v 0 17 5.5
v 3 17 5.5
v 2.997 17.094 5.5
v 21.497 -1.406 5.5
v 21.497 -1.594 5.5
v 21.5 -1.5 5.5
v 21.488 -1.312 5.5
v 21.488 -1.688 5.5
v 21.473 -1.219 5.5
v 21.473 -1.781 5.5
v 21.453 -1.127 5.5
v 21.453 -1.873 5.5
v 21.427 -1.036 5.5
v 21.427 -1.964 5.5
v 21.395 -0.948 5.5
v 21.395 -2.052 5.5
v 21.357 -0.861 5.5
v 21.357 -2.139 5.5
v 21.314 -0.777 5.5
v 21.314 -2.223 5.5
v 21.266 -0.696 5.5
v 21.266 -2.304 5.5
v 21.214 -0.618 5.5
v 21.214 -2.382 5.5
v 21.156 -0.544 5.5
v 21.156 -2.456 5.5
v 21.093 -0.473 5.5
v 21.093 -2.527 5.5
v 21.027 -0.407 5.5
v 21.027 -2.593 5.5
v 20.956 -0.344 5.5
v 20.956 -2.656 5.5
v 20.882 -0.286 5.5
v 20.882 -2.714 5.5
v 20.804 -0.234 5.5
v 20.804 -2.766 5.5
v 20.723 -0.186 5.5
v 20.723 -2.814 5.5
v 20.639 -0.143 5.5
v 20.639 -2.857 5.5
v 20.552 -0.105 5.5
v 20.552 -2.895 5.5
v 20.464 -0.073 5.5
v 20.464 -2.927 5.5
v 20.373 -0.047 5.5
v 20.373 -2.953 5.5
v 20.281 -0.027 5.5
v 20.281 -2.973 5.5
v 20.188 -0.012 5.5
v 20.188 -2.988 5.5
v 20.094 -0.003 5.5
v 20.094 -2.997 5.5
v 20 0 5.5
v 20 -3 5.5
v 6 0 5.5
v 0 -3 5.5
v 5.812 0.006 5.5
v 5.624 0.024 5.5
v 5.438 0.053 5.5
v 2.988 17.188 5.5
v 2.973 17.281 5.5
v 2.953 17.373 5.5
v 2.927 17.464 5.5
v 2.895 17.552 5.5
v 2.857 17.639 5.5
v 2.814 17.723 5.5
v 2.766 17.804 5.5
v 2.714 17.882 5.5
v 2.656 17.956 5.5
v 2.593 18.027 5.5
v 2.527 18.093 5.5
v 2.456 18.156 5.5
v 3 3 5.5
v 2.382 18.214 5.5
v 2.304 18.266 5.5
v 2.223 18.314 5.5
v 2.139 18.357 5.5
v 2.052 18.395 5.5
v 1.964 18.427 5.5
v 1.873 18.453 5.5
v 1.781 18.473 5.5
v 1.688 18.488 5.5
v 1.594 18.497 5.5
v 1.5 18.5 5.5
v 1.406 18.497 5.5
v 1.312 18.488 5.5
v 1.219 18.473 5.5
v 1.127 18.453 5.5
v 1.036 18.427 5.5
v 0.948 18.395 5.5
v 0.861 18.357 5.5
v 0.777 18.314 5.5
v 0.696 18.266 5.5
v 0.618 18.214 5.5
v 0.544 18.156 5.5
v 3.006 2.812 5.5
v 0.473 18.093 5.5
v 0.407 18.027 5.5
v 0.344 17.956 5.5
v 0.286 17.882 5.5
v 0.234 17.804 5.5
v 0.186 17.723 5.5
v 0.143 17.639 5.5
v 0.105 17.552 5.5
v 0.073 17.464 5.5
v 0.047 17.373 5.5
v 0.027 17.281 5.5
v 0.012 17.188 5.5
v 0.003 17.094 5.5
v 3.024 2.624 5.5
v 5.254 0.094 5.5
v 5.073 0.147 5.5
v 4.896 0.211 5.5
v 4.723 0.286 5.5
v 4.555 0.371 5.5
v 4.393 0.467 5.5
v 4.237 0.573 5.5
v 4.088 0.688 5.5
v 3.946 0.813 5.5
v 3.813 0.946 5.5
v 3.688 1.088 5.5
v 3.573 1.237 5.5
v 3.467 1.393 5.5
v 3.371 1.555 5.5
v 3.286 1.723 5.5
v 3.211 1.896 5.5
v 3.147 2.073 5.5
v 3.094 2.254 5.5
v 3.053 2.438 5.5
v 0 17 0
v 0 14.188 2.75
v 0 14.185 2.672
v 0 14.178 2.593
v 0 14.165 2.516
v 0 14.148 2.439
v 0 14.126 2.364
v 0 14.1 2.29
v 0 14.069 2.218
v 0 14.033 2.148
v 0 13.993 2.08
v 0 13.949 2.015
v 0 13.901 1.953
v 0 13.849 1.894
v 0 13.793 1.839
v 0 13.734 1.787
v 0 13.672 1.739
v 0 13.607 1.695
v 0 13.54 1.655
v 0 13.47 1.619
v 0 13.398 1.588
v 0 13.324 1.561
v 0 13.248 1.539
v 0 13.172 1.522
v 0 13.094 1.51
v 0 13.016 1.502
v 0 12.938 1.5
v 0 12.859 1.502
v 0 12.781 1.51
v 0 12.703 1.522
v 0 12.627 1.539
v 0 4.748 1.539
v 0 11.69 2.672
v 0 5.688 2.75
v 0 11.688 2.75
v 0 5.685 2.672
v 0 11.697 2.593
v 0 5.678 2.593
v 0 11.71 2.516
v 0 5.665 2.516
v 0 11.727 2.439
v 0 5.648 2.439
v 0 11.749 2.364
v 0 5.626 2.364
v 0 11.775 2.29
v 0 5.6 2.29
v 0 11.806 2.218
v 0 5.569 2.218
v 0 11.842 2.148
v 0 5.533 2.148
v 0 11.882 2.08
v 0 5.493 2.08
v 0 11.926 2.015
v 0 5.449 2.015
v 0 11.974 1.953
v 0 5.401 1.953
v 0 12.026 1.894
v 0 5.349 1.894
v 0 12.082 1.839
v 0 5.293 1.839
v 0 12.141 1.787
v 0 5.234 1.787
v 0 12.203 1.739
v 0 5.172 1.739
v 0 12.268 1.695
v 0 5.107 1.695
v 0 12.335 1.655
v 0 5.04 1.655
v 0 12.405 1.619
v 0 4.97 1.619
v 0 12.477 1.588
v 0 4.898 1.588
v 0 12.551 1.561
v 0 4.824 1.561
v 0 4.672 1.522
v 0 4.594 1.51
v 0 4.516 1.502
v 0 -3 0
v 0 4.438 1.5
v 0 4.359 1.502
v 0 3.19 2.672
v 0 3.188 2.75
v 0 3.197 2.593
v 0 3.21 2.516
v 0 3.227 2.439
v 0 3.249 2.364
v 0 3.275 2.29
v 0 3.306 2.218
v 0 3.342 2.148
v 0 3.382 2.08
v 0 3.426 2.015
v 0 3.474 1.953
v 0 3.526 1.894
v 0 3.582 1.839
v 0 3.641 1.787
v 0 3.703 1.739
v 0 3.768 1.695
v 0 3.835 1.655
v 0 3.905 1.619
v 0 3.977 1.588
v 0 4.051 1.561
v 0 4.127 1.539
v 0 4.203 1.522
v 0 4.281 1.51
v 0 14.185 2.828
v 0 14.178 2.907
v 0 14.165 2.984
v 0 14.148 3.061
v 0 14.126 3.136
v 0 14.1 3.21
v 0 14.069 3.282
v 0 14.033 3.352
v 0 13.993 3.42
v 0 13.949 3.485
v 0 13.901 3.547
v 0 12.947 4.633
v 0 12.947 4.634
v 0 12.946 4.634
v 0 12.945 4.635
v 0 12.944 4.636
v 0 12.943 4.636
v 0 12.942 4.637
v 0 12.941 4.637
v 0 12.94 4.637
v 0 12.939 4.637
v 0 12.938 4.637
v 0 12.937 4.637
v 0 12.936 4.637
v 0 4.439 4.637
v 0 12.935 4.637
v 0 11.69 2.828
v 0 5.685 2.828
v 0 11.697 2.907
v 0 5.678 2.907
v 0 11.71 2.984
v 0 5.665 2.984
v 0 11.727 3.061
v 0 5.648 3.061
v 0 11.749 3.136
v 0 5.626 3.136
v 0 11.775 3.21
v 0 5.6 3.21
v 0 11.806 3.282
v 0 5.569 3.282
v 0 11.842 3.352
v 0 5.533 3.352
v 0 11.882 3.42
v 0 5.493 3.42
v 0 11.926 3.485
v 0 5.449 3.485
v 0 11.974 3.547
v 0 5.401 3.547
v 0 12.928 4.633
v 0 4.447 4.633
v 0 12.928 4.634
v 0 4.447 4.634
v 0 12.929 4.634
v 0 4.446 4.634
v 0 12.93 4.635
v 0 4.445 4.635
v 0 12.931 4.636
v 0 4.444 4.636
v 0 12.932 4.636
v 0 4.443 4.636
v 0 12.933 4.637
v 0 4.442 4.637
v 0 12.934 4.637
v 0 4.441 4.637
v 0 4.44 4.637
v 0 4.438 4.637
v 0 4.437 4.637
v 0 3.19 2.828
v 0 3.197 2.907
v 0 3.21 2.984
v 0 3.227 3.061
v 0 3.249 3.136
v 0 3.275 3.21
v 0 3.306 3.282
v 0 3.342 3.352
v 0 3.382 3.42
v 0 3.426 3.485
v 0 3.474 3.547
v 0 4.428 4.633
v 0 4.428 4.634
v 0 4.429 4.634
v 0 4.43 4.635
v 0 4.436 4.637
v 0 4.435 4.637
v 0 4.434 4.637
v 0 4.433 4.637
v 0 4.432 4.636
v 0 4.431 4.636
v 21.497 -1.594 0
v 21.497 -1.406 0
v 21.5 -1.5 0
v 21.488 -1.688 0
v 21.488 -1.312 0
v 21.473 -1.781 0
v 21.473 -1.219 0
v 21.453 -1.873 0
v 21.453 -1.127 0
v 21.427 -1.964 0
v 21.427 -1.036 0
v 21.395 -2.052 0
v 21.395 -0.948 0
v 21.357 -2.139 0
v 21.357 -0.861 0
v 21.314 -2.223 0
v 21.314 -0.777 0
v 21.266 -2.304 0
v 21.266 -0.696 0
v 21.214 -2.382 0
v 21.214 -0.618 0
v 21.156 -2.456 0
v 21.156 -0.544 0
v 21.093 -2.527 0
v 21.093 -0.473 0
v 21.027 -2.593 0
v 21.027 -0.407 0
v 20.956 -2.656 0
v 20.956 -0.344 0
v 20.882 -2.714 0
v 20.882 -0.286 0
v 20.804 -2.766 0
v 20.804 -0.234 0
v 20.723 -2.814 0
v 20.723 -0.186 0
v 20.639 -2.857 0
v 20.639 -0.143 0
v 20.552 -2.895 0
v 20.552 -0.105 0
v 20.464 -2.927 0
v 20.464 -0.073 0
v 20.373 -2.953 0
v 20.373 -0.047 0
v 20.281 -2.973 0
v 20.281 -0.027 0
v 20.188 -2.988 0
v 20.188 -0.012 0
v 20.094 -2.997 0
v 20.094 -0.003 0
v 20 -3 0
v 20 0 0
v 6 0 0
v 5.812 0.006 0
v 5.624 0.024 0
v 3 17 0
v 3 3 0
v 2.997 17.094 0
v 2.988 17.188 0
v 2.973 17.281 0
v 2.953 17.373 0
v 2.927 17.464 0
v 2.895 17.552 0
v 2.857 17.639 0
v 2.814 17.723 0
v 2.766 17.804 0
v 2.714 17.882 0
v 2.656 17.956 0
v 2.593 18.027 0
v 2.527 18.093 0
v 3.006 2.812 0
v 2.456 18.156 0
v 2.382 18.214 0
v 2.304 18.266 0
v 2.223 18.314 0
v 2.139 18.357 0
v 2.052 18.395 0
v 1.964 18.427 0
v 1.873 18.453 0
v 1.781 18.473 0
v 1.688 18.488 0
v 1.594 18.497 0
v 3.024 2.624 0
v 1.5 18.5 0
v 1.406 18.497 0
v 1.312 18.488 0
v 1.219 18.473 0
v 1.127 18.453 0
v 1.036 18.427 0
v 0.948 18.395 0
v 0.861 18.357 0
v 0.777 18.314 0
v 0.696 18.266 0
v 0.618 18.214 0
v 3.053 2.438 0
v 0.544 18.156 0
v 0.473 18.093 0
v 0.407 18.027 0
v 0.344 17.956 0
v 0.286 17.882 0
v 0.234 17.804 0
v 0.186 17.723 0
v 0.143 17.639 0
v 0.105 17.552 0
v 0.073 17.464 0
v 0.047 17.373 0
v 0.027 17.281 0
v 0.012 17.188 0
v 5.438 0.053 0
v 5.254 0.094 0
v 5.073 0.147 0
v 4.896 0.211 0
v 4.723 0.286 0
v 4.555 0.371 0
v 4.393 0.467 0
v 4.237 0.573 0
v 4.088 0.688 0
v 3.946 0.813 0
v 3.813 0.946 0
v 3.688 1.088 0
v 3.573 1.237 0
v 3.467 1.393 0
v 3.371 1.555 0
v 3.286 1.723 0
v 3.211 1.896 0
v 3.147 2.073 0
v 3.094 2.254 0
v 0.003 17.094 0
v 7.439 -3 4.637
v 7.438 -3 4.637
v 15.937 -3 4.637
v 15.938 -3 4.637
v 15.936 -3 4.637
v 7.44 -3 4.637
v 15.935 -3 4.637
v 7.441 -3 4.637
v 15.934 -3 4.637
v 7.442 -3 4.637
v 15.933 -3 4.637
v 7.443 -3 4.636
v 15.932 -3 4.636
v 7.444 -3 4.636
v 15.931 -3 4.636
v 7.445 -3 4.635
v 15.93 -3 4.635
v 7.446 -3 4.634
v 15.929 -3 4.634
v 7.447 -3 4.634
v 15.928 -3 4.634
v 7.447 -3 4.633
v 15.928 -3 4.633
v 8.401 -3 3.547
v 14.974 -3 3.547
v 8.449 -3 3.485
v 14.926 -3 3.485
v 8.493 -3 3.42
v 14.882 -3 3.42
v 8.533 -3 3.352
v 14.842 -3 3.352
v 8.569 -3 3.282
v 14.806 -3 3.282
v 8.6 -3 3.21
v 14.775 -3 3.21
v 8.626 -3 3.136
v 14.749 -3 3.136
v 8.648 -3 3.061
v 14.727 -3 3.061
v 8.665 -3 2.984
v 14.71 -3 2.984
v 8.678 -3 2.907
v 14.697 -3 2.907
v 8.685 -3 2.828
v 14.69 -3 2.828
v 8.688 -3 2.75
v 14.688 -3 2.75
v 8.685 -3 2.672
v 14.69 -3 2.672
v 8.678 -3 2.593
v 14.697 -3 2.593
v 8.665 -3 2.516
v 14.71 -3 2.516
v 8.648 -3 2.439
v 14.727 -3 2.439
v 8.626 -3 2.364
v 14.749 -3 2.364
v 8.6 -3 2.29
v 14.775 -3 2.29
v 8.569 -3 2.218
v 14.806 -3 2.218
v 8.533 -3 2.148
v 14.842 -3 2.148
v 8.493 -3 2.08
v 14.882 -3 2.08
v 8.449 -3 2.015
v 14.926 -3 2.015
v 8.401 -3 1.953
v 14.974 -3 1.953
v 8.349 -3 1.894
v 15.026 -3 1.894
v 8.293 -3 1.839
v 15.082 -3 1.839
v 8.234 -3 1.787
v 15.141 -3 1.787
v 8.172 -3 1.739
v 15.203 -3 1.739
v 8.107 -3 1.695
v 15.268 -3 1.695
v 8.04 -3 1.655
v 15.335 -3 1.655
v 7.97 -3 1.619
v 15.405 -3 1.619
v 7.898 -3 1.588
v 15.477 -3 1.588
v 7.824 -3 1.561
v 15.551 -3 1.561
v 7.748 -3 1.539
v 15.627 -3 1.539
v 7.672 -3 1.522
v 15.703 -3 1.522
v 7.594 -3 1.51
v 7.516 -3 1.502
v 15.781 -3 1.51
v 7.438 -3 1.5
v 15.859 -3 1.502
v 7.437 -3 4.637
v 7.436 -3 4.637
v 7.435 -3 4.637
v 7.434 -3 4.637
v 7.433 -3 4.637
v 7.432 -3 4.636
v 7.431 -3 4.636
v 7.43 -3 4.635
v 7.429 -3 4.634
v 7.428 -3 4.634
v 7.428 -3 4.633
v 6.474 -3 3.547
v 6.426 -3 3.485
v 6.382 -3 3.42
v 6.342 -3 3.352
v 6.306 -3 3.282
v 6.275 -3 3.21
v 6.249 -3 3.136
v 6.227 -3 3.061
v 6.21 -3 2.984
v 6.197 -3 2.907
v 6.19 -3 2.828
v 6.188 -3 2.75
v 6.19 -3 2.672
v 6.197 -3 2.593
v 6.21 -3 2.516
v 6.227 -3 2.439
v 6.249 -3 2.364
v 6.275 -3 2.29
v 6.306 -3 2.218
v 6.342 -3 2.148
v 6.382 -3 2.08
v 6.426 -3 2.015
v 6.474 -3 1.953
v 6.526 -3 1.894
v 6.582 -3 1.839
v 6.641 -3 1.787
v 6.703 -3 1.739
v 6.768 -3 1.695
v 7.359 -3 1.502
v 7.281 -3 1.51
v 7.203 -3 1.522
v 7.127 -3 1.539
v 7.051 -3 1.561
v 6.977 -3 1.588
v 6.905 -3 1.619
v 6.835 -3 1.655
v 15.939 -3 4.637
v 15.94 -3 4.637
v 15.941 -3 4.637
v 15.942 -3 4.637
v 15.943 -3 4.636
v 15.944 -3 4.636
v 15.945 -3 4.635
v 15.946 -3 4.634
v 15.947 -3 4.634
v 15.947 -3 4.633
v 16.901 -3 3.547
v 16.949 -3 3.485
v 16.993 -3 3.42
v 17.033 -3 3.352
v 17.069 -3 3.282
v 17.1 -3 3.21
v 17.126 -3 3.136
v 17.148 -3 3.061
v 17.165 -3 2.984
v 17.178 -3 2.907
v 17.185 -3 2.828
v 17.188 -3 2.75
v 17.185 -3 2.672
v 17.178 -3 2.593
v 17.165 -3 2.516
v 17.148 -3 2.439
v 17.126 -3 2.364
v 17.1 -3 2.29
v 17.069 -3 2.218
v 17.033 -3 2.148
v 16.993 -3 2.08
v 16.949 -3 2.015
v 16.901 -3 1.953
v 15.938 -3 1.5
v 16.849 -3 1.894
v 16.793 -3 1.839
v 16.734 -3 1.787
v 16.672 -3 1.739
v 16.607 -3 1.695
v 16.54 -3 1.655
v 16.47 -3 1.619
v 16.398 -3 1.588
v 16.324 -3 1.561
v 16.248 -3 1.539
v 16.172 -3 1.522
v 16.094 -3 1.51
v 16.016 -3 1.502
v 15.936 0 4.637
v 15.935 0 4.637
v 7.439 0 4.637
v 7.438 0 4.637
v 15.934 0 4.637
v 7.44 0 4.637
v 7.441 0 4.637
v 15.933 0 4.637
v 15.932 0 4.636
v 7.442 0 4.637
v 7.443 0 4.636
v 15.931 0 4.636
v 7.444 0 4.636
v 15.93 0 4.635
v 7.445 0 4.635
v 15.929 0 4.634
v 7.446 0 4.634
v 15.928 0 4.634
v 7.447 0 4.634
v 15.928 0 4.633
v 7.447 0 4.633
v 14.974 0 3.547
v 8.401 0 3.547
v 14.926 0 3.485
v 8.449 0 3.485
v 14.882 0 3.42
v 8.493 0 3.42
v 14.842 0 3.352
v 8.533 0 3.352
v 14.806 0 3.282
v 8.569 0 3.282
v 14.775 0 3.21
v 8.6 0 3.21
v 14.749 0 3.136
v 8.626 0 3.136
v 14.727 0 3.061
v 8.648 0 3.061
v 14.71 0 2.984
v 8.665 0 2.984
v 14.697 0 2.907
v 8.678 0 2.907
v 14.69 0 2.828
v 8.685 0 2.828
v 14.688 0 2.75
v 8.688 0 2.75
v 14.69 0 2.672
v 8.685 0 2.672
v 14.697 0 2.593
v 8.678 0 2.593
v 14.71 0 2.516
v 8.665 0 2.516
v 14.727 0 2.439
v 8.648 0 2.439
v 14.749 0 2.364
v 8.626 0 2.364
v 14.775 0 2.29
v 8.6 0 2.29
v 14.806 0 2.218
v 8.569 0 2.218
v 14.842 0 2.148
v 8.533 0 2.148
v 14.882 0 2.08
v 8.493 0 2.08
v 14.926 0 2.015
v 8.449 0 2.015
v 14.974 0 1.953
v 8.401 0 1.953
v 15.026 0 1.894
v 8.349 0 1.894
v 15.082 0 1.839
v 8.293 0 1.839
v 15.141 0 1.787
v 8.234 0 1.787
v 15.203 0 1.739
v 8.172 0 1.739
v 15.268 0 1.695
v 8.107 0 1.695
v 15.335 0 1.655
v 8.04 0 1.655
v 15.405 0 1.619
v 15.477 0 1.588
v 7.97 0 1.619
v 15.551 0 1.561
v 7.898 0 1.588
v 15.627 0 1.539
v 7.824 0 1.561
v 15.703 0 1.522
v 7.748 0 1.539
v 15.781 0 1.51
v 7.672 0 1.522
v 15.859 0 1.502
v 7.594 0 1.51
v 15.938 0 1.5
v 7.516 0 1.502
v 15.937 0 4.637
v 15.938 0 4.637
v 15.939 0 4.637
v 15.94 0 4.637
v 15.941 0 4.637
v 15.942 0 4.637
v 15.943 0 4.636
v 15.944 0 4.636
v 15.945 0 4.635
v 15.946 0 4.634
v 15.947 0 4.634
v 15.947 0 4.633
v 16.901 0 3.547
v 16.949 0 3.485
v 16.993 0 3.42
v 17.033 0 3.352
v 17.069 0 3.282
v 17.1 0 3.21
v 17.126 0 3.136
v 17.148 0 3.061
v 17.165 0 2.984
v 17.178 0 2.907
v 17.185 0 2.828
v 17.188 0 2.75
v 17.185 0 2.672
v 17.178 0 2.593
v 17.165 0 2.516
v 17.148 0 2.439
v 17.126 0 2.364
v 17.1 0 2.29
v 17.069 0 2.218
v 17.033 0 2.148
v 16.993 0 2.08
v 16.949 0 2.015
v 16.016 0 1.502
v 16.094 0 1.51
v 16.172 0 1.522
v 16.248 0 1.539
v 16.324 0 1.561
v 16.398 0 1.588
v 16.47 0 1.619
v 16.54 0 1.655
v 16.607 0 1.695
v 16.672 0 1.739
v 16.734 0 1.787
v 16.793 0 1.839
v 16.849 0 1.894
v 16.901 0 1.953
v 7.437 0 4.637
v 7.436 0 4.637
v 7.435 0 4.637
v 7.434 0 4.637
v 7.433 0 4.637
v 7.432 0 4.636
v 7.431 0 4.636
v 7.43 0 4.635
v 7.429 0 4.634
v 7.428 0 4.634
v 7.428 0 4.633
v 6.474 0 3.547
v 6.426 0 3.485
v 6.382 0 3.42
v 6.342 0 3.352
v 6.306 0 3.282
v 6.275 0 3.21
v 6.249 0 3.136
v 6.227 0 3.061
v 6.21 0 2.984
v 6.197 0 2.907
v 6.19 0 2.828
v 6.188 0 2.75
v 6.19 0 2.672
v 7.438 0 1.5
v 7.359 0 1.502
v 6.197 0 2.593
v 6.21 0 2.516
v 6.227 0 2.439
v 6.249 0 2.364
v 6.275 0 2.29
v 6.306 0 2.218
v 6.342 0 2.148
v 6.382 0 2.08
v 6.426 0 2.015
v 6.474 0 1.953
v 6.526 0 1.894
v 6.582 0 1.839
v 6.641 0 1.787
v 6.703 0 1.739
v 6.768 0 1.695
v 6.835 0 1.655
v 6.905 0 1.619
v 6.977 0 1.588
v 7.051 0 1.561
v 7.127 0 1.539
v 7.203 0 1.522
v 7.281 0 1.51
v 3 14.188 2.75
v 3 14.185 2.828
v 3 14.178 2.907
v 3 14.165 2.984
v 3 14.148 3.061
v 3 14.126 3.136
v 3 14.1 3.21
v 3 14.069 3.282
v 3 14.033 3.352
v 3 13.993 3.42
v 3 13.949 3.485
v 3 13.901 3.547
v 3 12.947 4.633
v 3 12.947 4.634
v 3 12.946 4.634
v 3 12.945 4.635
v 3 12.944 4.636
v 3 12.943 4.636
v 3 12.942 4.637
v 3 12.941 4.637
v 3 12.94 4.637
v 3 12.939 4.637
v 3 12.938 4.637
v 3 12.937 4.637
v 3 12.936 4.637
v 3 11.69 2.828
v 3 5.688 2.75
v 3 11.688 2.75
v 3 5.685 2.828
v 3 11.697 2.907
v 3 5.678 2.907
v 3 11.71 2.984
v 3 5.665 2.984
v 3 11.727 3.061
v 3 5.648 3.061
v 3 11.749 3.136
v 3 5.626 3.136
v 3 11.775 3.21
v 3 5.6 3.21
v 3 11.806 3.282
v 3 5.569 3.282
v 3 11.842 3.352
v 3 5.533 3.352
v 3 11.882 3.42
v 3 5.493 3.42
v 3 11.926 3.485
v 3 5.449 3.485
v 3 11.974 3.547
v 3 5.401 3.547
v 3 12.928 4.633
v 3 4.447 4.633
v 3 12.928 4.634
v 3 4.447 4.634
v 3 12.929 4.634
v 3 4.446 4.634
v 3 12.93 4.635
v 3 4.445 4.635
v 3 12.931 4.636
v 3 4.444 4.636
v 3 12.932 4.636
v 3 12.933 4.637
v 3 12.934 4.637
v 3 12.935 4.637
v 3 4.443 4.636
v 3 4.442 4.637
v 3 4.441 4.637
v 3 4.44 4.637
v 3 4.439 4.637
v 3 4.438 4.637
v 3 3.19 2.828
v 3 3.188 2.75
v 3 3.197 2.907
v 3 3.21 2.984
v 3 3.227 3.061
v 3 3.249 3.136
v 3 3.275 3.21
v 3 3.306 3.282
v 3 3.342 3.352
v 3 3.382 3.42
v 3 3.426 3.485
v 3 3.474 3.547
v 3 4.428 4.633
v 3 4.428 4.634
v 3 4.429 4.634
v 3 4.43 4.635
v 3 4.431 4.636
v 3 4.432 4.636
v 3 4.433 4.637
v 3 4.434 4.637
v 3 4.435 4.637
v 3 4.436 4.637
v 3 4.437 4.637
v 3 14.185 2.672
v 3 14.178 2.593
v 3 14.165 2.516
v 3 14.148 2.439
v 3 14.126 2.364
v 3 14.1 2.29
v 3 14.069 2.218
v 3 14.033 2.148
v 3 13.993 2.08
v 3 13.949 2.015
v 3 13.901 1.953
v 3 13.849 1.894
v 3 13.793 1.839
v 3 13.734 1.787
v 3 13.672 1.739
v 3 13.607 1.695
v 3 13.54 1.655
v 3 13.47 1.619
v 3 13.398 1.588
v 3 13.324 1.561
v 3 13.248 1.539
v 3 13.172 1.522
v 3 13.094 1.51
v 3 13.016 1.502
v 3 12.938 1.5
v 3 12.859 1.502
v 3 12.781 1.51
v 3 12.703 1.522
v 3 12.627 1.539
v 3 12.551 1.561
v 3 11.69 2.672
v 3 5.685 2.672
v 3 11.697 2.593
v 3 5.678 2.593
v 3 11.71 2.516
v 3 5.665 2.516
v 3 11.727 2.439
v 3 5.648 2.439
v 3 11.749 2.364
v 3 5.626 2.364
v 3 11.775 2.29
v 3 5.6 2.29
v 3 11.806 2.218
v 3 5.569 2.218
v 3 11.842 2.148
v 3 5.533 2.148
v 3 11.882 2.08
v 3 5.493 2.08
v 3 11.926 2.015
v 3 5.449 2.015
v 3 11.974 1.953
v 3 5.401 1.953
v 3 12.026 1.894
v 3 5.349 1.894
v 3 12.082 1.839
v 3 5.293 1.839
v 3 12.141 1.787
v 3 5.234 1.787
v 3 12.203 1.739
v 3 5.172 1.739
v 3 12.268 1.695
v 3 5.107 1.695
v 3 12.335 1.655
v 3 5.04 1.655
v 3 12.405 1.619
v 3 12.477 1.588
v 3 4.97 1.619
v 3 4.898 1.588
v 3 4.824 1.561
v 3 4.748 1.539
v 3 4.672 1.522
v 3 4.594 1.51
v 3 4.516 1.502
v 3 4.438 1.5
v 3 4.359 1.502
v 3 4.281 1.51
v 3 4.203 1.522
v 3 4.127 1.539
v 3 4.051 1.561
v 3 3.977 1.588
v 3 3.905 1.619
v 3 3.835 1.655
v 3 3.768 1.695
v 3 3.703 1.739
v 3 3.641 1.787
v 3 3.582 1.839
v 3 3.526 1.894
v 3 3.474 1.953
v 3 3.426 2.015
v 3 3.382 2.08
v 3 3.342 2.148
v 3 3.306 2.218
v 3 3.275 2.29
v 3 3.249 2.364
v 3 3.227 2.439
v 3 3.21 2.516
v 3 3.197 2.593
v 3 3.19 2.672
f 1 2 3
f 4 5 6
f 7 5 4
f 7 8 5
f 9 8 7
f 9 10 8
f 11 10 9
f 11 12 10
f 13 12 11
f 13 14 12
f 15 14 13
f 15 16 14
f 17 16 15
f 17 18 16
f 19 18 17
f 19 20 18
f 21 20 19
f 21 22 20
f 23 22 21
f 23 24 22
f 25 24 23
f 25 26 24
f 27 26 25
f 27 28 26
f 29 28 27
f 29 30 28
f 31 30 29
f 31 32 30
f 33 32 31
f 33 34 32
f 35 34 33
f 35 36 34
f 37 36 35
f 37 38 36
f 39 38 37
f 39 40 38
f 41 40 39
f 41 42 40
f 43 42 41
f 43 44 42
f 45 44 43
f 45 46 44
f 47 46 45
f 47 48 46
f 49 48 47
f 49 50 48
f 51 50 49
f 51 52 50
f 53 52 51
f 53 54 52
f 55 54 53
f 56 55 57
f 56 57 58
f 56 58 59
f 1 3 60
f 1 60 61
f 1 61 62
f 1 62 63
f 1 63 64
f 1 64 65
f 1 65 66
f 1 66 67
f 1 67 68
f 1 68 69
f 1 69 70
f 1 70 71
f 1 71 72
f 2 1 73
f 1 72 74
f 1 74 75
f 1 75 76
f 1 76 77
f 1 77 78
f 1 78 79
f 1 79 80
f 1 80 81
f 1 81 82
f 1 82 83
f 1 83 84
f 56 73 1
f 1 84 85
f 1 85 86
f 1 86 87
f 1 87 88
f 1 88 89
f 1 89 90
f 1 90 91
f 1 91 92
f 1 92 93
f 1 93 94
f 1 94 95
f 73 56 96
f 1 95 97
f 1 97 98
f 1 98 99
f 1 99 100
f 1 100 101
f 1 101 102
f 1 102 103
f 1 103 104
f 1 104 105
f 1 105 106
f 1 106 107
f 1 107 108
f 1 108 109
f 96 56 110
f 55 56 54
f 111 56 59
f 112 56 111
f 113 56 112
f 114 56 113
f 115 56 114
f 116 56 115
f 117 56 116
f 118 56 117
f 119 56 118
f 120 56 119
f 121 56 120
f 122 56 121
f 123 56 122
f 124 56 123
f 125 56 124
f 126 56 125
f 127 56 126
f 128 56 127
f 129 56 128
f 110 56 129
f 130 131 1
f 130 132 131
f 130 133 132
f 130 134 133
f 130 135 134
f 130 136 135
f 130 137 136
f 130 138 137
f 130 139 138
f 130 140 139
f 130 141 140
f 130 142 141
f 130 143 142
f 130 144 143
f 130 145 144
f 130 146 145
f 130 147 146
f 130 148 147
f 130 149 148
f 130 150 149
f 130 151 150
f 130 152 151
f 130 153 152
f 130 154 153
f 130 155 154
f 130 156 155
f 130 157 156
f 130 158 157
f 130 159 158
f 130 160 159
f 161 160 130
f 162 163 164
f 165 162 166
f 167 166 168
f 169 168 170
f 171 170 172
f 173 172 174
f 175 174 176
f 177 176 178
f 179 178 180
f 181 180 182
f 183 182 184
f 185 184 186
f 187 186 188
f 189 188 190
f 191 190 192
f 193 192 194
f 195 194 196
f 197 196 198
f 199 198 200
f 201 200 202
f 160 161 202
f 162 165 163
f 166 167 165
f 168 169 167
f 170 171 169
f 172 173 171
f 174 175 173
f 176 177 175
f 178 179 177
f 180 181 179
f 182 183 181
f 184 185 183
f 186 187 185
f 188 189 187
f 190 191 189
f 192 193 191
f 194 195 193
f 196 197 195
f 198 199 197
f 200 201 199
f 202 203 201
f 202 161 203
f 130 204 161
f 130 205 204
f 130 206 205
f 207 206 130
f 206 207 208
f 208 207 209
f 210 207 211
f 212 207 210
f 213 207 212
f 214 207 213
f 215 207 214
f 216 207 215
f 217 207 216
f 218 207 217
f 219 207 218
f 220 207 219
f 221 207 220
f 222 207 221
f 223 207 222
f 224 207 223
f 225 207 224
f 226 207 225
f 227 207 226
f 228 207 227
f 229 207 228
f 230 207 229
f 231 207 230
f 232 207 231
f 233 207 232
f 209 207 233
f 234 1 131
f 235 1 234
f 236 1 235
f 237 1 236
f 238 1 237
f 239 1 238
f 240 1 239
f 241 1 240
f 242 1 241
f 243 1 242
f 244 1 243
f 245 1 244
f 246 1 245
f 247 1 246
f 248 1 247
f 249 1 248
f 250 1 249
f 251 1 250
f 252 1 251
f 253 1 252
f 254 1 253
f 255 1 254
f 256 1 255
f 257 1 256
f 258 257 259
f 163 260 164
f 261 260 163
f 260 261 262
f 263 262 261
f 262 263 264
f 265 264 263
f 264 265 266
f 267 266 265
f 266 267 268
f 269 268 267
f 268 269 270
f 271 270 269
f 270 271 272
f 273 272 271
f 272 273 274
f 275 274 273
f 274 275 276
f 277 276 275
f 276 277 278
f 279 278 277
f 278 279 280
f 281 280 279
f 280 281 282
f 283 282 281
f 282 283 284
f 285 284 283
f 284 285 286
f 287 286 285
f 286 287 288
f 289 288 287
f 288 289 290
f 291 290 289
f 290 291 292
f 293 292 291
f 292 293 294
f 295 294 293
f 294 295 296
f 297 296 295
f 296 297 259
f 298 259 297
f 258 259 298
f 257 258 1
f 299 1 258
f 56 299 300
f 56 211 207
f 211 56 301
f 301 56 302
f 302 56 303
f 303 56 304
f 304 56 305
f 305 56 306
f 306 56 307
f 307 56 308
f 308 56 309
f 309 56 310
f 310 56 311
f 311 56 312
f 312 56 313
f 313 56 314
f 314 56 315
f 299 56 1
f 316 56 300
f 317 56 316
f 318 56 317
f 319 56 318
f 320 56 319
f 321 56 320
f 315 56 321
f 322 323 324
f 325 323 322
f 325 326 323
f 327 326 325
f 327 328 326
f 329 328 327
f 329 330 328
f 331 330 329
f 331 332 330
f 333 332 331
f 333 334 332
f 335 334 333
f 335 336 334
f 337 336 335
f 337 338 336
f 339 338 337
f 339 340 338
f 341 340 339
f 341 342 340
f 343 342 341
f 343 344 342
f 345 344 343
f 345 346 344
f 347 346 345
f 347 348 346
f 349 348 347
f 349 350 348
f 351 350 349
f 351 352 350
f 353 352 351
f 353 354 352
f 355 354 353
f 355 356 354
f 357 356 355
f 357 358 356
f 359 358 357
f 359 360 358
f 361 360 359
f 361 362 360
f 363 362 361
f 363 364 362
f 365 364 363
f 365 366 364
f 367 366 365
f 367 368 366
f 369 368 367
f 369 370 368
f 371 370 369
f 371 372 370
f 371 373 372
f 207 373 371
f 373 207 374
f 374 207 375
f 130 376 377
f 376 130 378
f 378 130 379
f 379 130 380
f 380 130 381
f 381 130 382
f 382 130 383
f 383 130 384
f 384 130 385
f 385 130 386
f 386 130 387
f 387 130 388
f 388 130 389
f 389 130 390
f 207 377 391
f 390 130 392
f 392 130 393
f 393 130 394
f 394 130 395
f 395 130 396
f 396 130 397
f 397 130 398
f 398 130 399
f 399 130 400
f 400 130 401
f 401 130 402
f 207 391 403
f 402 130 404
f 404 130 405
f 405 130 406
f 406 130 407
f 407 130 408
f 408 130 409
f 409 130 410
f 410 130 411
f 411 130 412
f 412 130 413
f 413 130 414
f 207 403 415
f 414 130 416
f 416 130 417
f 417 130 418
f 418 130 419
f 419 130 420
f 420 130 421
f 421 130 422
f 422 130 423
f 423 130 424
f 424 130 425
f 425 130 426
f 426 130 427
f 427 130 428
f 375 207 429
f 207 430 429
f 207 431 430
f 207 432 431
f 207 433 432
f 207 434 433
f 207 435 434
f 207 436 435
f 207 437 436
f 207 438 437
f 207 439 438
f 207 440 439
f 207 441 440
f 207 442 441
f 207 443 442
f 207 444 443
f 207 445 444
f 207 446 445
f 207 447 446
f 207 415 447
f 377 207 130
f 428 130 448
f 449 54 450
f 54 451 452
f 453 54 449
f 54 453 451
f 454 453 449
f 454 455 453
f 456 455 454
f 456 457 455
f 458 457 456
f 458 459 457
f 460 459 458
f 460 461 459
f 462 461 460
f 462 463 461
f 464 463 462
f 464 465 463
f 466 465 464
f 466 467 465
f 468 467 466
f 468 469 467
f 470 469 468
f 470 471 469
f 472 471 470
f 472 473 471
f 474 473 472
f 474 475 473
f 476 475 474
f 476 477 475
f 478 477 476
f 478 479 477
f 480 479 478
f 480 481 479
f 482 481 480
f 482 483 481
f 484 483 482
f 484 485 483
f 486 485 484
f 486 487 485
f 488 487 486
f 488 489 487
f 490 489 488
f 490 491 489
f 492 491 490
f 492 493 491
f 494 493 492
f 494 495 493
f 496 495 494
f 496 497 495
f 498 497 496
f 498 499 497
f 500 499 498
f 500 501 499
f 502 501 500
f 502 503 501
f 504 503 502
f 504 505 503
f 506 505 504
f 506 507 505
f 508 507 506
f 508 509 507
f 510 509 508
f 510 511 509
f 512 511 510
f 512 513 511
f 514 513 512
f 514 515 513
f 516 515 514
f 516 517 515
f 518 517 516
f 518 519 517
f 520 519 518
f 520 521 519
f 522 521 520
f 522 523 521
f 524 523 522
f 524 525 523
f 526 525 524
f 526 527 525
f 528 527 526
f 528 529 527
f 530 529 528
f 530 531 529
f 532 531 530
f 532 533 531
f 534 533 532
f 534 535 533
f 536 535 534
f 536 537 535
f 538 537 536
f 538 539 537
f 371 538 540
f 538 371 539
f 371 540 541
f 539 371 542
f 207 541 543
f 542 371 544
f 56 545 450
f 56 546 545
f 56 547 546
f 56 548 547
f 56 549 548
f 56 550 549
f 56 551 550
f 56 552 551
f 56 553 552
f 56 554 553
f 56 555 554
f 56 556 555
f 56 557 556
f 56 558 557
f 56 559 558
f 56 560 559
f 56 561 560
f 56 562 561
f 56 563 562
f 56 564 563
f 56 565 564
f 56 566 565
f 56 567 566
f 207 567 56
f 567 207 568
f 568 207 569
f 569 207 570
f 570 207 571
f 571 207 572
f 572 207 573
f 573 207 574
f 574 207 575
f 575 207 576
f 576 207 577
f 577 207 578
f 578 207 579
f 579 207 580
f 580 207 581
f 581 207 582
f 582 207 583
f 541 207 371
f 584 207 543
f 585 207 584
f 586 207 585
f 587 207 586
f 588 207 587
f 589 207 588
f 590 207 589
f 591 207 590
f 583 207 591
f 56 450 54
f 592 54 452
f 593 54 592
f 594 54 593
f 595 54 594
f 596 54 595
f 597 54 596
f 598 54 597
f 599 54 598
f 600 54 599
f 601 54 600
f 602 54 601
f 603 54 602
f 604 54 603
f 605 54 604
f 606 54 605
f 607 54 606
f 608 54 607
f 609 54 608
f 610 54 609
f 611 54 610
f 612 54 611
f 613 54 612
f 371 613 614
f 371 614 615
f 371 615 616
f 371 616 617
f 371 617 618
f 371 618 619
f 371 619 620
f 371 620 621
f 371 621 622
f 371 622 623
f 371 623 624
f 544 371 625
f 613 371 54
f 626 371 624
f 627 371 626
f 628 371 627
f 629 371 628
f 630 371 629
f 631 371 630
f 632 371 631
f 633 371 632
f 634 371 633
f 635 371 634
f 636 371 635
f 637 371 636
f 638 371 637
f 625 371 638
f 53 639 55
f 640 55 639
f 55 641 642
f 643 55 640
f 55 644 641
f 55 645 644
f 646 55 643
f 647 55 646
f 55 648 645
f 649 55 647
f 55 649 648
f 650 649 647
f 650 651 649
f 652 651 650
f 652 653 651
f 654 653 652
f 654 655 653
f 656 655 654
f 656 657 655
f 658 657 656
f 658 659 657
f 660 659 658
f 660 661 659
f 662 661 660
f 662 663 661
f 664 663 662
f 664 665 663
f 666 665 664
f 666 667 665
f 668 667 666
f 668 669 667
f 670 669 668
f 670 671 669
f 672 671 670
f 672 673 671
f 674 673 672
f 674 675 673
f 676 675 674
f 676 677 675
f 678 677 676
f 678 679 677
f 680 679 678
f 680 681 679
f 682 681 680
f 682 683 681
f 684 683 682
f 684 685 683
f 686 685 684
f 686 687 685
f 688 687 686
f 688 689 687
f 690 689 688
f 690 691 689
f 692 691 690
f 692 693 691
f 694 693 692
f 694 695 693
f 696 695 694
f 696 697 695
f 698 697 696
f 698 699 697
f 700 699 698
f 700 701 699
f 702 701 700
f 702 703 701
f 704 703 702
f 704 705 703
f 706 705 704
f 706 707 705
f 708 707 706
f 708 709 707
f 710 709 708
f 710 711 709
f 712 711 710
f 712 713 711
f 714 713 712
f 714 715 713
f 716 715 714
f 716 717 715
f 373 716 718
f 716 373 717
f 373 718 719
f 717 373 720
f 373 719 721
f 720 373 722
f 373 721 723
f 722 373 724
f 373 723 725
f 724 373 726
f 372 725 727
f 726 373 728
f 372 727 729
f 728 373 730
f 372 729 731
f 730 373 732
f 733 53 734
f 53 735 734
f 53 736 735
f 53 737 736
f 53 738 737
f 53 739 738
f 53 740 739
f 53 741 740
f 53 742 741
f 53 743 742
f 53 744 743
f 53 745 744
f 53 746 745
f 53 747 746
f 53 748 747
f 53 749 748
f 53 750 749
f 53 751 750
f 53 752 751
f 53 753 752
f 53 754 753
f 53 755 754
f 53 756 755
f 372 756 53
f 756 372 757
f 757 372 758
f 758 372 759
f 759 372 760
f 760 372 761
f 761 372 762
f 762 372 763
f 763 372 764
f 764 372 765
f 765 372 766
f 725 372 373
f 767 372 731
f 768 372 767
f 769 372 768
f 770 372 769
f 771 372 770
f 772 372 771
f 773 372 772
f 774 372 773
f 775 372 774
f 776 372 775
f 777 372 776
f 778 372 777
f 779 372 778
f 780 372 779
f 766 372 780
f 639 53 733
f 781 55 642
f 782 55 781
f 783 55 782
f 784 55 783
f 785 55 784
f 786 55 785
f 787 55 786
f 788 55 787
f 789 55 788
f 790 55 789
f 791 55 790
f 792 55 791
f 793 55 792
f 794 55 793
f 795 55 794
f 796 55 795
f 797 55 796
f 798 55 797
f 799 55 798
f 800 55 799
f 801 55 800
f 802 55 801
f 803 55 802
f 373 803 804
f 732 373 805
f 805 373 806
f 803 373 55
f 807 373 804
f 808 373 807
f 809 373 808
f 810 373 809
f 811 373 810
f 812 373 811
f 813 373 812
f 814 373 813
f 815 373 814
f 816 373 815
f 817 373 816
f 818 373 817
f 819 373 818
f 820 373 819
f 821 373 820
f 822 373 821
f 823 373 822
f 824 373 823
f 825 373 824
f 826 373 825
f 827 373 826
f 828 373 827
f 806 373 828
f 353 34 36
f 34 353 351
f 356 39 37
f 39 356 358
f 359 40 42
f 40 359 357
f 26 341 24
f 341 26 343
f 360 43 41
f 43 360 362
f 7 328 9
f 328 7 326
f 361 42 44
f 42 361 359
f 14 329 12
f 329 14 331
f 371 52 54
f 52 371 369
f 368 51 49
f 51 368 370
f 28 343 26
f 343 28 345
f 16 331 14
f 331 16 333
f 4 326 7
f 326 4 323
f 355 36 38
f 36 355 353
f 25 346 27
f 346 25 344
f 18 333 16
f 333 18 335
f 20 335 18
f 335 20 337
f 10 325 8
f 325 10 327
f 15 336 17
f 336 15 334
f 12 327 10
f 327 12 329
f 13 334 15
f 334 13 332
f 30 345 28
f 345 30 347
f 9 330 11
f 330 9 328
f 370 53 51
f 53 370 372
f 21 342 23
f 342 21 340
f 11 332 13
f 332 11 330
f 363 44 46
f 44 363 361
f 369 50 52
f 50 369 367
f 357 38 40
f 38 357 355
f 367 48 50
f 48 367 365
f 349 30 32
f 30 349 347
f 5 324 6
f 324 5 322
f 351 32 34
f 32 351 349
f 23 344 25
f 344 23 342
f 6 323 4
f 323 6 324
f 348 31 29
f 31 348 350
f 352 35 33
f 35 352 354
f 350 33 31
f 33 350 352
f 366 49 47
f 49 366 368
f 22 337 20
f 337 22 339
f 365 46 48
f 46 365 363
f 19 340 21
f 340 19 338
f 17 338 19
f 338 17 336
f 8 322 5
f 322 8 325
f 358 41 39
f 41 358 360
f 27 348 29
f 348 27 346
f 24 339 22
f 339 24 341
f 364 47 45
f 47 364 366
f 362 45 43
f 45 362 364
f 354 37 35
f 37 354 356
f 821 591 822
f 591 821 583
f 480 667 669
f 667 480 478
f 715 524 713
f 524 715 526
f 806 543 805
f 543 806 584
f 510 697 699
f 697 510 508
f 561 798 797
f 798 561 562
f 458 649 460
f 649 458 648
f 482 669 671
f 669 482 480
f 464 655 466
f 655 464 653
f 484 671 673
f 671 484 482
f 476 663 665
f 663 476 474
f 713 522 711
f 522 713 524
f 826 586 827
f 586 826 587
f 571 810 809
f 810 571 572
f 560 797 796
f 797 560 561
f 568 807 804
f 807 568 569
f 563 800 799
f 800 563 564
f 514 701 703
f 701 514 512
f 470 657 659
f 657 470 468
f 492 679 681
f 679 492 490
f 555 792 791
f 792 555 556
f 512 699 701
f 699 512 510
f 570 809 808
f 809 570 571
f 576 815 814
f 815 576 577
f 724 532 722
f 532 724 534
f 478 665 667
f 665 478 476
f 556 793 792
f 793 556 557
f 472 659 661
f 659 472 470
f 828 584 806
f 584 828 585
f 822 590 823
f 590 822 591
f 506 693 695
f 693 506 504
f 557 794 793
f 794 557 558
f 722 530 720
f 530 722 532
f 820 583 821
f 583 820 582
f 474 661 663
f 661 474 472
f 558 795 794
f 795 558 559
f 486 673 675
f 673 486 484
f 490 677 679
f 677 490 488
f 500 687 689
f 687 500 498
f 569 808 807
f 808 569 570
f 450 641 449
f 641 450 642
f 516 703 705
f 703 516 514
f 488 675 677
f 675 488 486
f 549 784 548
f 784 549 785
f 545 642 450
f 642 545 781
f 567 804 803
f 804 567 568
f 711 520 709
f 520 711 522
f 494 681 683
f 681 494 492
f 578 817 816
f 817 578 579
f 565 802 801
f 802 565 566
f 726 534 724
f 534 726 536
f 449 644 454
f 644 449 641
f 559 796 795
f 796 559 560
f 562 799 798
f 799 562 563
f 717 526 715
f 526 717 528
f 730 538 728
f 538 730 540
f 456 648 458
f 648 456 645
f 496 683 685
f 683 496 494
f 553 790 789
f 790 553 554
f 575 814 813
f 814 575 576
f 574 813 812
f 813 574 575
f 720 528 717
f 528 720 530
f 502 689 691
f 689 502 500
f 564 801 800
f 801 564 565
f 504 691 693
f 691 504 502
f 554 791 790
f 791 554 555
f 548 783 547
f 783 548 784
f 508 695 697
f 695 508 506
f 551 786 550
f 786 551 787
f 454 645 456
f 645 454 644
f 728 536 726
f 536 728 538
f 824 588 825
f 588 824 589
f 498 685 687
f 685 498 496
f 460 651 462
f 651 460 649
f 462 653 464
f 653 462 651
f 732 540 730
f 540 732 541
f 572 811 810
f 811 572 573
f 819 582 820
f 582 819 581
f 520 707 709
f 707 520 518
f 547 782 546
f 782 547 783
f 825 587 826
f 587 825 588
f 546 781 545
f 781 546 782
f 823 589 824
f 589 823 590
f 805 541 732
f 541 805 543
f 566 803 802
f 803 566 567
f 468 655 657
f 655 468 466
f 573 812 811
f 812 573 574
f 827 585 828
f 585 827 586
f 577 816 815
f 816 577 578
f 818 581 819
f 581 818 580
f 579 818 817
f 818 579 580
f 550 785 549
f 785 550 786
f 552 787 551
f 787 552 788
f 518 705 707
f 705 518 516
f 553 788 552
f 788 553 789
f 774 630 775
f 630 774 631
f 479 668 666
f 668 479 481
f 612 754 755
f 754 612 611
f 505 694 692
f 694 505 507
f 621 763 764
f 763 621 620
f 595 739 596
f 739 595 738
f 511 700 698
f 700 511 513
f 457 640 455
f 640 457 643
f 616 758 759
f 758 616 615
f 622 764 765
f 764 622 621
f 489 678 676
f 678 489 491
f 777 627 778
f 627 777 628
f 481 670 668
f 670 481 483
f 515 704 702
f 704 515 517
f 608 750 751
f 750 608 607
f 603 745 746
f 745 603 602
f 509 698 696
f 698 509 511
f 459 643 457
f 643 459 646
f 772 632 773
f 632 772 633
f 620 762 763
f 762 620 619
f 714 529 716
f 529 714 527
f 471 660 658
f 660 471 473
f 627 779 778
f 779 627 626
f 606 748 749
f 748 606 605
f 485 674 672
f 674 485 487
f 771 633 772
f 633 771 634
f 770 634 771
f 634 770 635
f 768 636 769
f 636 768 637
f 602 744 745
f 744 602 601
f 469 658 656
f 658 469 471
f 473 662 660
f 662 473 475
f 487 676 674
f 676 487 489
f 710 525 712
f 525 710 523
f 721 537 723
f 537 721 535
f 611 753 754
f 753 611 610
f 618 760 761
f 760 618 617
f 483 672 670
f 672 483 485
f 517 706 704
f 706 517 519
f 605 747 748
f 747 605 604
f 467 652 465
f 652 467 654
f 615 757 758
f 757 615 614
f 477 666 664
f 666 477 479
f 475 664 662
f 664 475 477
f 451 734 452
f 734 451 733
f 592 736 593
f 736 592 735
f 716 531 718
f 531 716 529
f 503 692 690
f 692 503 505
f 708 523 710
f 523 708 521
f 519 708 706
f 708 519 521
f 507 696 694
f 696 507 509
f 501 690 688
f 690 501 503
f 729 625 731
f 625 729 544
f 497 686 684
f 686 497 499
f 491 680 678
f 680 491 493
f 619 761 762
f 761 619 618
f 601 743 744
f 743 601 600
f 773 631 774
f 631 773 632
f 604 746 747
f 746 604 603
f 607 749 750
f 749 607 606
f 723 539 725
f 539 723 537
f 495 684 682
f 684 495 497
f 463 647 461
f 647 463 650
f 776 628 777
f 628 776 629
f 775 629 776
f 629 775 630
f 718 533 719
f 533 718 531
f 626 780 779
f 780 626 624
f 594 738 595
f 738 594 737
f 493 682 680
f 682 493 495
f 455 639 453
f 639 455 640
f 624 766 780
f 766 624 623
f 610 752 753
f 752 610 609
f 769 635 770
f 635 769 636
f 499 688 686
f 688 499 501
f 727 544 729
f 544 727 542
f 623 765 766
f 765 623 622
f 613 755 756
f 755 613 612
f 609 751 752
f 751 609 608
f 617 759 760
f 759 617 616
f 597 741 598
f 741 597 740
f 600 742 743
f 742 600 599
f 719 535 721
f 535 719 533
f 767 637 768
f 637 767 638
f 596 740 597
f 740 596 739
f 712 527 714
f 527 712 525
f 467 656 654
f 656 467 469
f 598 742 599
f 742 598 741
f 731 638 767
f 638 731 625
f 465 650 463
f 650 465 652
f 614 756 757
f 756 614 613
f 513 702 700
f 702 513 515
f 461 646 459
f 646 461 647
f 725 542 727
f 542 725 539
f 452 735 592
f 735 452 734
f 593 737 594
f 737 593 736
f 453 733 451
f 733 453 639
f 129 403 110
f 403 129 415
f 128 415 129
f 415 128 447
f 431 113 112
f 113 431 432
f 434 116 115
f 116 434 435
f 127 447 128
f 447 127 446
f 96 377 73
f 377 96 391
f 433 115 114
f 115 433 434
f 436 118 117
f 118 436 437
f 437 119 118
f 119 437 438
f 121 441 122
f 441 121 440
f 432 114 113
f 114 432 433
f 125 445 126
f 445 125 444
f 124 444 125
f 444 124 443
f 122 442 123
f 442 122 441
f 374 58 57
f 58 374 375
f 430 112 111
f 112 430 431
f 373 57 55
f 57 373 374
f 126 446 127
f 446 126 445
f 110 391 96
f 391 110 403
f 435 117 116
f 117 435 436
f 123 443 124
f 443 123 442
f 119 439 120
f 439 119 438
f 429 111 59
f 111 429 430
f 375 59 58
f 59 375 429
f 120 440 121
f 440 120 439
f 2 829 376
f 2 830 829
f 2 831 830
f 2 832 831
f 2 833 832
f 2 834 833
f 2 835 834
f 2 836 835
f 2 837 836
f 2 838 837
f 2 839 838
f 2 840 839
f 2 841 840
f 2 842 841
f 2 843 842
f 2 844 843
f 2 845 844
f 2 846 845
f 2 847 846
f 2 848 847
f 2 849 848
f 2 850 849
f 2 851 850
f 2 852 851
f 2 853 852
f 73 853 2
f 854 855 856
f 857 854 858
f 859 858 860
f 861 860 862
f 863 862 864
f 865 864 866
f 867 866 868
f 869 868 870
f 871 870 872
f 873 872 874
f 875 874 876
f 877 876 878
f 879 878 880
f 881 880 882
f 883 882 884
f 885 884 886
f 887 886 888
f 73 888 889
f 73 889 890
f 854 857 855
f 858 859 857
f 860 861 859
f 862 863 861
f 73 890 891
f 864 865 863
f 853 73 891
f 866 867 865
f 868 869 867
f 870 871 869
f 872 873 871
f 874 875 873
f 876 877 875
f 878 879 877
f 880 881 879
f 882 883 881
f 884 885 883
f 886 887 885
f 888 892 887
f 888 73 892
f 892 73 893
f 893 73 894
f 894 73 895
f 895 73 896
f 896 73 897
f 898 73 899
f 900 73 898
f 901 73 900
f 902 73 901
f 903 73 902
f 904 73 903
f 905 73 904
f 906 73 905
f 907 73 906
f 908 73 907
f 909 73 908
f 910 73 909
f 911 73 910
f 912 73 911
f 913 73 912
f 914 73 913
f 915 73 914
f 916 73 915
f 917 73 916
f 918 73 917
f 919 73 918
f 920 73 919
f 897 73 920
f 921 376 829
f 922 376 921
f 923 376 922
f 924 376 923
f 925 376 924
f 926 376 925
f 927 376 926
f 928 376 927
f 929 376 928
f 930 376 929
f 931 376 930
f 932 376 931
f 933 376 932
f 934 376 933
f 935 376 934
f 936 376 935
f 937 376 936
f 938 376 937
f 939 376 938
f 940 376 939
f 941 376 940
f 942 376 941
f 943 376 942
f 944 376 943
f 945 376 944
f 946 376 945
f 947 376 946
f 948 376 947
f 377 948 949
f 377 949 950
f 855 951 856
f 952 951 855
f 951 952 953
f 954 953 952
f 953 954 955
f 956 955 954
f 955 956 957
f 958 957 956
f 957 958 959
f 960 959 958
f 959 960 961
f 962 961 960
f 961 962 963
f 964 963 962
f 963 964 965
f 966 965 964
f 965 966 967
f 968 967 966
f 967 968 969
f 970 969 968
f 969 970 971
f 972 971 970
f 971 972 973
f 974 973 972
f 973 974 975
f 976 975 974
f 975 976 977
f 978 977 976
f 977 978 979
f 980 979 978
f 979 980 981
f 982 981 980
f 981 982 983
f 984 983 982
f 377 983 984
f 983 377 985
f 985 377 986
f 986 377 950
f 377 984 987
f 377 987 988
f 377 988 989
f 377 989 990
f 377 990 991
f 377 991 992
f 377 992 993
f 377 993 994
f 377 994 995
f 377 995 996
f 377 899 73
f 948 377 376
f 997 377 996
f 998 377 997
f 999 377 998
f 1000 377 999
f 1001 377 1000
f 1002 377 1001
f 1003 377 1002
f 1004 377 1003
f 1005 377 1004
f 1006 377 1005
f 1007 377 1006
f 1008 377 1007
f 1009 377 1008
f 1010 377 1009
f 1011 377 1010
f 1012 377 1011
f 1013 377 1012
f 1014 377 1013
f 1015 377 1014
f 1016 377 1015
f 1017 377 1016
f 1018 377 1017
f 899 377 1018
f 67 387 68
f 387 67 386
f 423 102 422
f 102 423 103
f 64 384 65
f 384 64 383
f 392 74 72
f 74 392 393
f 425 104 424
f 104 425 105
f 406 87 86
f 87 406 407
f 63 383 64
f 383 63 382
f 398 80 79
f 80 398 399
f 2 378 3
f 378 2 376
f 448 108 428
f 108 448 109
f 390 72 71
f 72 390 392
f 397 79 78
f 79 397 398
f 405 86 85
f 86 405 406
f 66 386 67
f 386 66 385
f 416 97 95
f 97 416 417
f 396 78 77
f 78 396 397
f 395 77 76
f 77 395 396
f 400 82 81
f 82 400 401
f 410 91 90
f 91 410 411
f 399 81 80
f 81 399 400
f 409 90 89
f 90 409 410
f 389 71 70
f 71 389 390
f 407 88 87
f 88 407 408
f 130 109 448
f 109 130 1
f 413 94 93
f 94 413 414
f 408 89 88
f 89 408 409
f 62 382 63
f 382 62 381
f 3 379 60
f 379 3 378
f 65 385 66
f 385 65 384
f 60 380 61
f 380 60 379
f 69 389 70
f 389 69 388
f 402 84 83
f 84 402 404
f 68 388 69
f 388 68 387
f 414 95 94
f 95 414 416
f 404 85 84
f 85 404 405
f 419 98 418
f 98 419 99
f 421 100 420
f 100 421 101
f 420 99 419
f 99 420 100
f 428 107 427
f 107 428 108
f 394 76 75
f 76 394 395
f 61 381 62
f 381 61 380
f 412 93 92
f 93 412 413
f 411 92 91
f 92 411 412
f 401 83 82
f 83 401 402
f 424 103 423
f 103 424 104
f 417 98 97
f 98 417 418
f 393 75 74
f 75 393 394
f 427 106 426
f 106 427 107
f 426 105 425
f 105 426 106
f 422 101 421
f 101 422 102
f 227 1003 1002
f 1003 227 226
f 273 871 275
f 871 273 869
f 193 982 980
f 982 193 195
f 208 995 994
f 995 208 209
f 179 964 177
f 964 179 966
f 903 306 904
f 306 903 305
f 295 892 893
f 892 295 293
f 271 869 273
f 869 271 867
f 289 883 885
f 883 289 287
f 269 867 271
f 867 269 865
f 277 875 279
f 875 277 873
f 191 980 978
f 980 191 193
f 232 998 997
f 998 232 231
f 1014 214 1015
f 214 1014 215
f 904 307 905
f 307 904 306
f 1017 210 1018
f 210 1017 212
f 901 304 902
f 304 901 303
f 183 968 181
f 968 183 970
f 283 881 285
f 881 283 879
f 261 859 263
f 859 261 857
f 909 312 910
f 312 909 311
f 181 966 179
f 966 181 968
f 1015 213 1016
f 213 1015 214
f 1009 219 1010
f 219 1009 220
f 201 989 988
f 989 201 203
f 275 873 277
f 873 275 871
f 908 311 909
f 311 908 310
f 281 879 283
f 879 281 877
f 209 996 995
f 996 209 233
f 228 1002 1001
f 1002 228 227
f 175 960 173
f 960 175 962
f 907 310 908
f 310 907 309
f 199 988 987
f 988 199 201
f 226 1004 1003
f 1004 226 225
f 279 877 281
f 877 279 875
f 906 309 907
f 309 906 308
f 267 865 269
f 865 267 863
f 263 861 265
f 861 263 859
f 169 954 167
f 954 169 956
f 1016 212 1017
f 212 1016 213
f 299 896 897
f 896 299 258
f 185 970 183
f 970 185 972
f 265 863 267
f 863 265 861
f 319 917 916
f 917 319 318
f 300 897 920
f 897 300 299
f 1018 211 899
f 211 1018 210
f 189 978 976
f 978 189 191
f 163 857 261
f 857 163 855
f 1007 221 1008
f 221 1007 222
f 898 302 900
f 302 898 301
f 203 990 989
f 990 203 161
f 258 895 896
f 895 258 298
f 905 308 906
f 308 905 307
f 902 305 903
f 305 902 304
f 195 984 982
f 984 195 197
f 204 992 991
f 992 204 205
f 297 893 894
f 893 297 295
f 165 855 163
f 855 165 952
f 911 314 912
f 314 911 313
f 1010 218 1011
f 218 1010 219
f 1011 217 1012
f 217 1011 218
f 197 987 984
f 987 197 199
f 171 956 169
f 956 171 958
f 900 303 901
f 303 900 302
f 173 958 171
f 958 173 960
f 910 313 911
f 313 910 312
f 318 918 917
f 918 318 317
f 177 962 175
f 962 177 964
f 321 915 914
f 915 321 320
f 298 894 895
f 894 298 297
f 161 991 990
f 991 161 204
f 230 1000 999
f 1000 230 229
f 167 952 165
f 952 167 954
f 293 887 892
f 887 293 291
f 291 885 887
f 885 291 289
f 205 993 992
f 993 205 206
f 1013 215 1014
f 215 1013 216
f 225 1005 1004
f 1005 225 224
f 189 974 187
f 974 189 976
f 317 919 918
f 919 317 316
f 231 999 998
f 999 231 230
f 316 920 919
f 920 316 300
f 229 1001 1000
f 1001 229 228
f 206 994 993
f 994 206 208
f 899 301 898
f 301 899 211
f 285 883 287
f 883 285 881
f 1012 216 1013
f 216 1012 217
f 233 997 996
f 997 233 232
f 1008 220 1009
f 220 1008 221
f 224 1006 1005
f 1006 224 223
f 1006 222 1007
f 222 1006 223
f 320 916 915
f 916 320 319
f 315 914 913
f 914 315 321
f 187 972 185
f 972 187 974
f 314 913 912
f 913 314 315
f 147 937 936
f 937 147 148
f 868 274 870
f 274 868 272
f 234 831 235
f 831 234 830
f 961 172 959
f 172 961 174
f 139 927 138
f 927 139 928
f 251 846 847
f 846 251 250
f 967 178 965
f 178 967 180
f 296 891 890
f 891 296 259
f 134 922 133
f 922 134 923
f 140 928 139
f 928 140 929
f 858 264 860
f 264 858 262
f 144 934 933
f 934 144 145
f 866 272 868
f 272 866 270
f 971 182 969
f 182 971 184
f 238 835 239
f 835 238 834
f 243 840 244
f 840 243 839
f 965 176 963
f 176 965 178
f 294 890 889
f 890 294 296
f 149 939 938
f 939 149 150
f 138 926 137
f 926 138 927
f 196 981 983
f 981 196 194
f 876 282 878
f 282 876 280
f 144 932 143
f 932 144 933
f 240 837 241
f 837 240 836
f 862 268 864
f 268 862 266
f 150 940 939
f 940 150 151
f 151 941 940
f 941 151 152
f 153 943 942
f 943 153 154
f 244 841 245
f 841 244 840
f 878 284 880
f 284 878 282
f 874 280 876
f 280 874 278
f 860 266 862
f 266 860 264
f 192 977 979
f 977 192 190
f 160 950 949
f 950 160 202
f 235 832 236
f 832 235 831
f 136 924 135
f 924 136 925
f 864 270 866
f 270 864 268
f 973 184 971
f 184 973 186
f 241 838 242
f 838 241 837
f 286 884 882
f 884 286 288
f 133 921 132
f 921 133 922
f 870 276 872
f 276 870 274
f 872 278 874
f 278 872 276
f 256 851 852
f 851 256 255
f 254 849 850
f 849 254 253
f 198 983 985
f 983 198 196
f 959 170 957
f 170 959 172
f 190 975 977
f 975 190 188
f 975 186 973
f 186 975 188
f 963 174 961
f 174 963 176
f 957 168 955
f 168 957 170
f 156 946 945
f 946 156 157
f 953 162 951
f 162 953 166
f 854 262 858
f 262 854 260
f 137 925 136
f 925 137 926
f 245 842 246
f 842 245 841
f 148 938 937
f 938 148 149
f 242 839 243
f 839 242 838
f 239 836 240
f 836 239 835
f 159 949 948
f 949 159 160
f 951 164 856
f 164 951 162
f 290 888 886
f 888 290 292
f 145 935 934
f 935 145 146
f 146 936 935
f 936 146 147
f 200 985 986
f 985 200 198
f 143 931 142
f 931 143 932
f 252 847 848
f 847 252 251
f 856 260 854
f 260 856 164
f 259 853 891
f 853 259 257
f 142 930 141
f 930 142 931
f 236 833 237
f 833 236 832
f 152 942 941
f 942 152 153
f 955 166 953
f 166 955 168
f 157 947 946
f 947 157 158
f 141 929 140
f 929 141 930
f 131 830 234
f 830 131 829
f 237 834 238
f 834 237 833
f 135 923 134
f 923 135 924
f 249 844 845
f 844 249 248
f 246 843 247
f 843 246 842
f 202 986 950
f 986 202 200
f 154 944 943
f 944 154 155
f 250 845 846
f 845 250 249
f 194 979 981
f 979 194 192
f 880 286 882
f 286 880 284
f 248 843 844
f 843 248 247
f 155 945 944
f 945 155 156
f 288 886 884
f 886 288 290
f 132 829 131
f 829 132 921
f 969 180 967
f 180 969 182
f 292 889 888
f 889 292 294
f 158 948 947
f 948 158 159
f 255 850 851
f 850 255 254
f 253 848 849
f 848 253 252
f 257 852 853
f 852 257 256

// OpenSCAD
/*
Adjustable Corner Bracket -- Version 2
* Print Unsupported
* by Harlo_DX
* 9/11/2015
*/

//brackets sizing
//Width in of the bracket (mm): 
c_w = 5.5; //[5:0.5:100]
//Height of the bracket (mm):
c_h = 20; //[11:0.5:100]
//Depth of the bracket (mm):
c_d = 3; //[0.5:0.25:20]

//Bolt hole diameter in mm:
diameter = 2.5; //[0.25:0.25:30]

//Number of bolt holes:
bolt_holes = 2; //[0,1,2]

//Extra space between bolts:
seperation = 3; //[0.5:0.25:20]


////////////////////
//INTERNAL VARIABLES
////////////////////

hole_size = diameter/2; //radius (multiply by 2 for the diameter)
multiplier = 1*1;  // affects the smoothness of the chamfer -- keep turning up **gradually** to reduce sharp edges.
spread = c_h/5; //NOT FINAL



//////////////////////////////
////////////////////////RENDER
//////////////////////////////

rotate([0,-90,180]){
// initial side of bracket
cut_bracket(); //WORKING
// internal chamfer
corner_chamfer(); //WORKING

//bottom bracket  //WORKING
translate([0,c_d,0]){
    rotate (90, [1,0,0]){ // handles the pivot action
        cut_bracket();
        }
    }
}
//////////////////////////////
/////////////////////FUNCTIONS
//////////////////////////////    
 
module corner_chamfer () {
    
    difference(){
    //cube
    translate([0,-c_d,0]){
    cube([c_w, c_d*2, c_d*2], false);
    }
    
    //cylinder
    translate([-0.5,-c_d,c_d*2]){
        rotate(90, [0,1,0]){
        cylinder(c_w+1, c_d*multiplier, c_d*multiplier, false, $fn = 100);
        }
    }
}
    
}

module cut_bracket(){
    difference(){
        union(){
            //corner_chamfer(); //TEST
            bracket_side(); //WORKING
        }
        if (bolt_holes == 1){
            cut_out();
        }
        
        if (bolt_holes == 2){
        dual_cut_out();
        }
}
}    

module bracket_side () {
    cube([c_w, c_d, c_h], false);
    curved_tip();
}

module curved_tip () {
        translate([0,c_d/2,c_h]){
            rotate(90, [0,1,0]){
                cylinder(c_w, (c_d/2)*multiplier, (c_d/2)*multiplier, false, $fn = 100);
                }
           }
    }
    
module dual_cut_out(){
        translate([0, 0, -(hole_size + seperation)]){
        cut_out();
        }
        translate([0, 0, hole_size + seperation]){
        cut_out();
        }        
        }

module cut_out (){
    
    //This hull function lets you print without support
    hull(){
        
        $fn=100; //defines resolution

    translate([
        c_w/2
        ,c_d+1
        ,(c_h +(c_w/2)+(hole_size/2))*0.5]){
        rotate(90, [1,0,0]){
            cylinder(c_d+5, hole_size, hole_size, false);
        }
    }
    
    translate([
    (c_w/2)+((hole_size)*1.5) //Shifts across by an extra 50% of the hole_size value
    ,c_d+1
    ,(c_h+(c_w/2)+(hole_size/2))*0.5])
        {
        rotate(90, [1,0,0]){
            cylinder(c_d+5, hole_size*0.01, hole_size*0.01, false);
        }
    }
}

}
